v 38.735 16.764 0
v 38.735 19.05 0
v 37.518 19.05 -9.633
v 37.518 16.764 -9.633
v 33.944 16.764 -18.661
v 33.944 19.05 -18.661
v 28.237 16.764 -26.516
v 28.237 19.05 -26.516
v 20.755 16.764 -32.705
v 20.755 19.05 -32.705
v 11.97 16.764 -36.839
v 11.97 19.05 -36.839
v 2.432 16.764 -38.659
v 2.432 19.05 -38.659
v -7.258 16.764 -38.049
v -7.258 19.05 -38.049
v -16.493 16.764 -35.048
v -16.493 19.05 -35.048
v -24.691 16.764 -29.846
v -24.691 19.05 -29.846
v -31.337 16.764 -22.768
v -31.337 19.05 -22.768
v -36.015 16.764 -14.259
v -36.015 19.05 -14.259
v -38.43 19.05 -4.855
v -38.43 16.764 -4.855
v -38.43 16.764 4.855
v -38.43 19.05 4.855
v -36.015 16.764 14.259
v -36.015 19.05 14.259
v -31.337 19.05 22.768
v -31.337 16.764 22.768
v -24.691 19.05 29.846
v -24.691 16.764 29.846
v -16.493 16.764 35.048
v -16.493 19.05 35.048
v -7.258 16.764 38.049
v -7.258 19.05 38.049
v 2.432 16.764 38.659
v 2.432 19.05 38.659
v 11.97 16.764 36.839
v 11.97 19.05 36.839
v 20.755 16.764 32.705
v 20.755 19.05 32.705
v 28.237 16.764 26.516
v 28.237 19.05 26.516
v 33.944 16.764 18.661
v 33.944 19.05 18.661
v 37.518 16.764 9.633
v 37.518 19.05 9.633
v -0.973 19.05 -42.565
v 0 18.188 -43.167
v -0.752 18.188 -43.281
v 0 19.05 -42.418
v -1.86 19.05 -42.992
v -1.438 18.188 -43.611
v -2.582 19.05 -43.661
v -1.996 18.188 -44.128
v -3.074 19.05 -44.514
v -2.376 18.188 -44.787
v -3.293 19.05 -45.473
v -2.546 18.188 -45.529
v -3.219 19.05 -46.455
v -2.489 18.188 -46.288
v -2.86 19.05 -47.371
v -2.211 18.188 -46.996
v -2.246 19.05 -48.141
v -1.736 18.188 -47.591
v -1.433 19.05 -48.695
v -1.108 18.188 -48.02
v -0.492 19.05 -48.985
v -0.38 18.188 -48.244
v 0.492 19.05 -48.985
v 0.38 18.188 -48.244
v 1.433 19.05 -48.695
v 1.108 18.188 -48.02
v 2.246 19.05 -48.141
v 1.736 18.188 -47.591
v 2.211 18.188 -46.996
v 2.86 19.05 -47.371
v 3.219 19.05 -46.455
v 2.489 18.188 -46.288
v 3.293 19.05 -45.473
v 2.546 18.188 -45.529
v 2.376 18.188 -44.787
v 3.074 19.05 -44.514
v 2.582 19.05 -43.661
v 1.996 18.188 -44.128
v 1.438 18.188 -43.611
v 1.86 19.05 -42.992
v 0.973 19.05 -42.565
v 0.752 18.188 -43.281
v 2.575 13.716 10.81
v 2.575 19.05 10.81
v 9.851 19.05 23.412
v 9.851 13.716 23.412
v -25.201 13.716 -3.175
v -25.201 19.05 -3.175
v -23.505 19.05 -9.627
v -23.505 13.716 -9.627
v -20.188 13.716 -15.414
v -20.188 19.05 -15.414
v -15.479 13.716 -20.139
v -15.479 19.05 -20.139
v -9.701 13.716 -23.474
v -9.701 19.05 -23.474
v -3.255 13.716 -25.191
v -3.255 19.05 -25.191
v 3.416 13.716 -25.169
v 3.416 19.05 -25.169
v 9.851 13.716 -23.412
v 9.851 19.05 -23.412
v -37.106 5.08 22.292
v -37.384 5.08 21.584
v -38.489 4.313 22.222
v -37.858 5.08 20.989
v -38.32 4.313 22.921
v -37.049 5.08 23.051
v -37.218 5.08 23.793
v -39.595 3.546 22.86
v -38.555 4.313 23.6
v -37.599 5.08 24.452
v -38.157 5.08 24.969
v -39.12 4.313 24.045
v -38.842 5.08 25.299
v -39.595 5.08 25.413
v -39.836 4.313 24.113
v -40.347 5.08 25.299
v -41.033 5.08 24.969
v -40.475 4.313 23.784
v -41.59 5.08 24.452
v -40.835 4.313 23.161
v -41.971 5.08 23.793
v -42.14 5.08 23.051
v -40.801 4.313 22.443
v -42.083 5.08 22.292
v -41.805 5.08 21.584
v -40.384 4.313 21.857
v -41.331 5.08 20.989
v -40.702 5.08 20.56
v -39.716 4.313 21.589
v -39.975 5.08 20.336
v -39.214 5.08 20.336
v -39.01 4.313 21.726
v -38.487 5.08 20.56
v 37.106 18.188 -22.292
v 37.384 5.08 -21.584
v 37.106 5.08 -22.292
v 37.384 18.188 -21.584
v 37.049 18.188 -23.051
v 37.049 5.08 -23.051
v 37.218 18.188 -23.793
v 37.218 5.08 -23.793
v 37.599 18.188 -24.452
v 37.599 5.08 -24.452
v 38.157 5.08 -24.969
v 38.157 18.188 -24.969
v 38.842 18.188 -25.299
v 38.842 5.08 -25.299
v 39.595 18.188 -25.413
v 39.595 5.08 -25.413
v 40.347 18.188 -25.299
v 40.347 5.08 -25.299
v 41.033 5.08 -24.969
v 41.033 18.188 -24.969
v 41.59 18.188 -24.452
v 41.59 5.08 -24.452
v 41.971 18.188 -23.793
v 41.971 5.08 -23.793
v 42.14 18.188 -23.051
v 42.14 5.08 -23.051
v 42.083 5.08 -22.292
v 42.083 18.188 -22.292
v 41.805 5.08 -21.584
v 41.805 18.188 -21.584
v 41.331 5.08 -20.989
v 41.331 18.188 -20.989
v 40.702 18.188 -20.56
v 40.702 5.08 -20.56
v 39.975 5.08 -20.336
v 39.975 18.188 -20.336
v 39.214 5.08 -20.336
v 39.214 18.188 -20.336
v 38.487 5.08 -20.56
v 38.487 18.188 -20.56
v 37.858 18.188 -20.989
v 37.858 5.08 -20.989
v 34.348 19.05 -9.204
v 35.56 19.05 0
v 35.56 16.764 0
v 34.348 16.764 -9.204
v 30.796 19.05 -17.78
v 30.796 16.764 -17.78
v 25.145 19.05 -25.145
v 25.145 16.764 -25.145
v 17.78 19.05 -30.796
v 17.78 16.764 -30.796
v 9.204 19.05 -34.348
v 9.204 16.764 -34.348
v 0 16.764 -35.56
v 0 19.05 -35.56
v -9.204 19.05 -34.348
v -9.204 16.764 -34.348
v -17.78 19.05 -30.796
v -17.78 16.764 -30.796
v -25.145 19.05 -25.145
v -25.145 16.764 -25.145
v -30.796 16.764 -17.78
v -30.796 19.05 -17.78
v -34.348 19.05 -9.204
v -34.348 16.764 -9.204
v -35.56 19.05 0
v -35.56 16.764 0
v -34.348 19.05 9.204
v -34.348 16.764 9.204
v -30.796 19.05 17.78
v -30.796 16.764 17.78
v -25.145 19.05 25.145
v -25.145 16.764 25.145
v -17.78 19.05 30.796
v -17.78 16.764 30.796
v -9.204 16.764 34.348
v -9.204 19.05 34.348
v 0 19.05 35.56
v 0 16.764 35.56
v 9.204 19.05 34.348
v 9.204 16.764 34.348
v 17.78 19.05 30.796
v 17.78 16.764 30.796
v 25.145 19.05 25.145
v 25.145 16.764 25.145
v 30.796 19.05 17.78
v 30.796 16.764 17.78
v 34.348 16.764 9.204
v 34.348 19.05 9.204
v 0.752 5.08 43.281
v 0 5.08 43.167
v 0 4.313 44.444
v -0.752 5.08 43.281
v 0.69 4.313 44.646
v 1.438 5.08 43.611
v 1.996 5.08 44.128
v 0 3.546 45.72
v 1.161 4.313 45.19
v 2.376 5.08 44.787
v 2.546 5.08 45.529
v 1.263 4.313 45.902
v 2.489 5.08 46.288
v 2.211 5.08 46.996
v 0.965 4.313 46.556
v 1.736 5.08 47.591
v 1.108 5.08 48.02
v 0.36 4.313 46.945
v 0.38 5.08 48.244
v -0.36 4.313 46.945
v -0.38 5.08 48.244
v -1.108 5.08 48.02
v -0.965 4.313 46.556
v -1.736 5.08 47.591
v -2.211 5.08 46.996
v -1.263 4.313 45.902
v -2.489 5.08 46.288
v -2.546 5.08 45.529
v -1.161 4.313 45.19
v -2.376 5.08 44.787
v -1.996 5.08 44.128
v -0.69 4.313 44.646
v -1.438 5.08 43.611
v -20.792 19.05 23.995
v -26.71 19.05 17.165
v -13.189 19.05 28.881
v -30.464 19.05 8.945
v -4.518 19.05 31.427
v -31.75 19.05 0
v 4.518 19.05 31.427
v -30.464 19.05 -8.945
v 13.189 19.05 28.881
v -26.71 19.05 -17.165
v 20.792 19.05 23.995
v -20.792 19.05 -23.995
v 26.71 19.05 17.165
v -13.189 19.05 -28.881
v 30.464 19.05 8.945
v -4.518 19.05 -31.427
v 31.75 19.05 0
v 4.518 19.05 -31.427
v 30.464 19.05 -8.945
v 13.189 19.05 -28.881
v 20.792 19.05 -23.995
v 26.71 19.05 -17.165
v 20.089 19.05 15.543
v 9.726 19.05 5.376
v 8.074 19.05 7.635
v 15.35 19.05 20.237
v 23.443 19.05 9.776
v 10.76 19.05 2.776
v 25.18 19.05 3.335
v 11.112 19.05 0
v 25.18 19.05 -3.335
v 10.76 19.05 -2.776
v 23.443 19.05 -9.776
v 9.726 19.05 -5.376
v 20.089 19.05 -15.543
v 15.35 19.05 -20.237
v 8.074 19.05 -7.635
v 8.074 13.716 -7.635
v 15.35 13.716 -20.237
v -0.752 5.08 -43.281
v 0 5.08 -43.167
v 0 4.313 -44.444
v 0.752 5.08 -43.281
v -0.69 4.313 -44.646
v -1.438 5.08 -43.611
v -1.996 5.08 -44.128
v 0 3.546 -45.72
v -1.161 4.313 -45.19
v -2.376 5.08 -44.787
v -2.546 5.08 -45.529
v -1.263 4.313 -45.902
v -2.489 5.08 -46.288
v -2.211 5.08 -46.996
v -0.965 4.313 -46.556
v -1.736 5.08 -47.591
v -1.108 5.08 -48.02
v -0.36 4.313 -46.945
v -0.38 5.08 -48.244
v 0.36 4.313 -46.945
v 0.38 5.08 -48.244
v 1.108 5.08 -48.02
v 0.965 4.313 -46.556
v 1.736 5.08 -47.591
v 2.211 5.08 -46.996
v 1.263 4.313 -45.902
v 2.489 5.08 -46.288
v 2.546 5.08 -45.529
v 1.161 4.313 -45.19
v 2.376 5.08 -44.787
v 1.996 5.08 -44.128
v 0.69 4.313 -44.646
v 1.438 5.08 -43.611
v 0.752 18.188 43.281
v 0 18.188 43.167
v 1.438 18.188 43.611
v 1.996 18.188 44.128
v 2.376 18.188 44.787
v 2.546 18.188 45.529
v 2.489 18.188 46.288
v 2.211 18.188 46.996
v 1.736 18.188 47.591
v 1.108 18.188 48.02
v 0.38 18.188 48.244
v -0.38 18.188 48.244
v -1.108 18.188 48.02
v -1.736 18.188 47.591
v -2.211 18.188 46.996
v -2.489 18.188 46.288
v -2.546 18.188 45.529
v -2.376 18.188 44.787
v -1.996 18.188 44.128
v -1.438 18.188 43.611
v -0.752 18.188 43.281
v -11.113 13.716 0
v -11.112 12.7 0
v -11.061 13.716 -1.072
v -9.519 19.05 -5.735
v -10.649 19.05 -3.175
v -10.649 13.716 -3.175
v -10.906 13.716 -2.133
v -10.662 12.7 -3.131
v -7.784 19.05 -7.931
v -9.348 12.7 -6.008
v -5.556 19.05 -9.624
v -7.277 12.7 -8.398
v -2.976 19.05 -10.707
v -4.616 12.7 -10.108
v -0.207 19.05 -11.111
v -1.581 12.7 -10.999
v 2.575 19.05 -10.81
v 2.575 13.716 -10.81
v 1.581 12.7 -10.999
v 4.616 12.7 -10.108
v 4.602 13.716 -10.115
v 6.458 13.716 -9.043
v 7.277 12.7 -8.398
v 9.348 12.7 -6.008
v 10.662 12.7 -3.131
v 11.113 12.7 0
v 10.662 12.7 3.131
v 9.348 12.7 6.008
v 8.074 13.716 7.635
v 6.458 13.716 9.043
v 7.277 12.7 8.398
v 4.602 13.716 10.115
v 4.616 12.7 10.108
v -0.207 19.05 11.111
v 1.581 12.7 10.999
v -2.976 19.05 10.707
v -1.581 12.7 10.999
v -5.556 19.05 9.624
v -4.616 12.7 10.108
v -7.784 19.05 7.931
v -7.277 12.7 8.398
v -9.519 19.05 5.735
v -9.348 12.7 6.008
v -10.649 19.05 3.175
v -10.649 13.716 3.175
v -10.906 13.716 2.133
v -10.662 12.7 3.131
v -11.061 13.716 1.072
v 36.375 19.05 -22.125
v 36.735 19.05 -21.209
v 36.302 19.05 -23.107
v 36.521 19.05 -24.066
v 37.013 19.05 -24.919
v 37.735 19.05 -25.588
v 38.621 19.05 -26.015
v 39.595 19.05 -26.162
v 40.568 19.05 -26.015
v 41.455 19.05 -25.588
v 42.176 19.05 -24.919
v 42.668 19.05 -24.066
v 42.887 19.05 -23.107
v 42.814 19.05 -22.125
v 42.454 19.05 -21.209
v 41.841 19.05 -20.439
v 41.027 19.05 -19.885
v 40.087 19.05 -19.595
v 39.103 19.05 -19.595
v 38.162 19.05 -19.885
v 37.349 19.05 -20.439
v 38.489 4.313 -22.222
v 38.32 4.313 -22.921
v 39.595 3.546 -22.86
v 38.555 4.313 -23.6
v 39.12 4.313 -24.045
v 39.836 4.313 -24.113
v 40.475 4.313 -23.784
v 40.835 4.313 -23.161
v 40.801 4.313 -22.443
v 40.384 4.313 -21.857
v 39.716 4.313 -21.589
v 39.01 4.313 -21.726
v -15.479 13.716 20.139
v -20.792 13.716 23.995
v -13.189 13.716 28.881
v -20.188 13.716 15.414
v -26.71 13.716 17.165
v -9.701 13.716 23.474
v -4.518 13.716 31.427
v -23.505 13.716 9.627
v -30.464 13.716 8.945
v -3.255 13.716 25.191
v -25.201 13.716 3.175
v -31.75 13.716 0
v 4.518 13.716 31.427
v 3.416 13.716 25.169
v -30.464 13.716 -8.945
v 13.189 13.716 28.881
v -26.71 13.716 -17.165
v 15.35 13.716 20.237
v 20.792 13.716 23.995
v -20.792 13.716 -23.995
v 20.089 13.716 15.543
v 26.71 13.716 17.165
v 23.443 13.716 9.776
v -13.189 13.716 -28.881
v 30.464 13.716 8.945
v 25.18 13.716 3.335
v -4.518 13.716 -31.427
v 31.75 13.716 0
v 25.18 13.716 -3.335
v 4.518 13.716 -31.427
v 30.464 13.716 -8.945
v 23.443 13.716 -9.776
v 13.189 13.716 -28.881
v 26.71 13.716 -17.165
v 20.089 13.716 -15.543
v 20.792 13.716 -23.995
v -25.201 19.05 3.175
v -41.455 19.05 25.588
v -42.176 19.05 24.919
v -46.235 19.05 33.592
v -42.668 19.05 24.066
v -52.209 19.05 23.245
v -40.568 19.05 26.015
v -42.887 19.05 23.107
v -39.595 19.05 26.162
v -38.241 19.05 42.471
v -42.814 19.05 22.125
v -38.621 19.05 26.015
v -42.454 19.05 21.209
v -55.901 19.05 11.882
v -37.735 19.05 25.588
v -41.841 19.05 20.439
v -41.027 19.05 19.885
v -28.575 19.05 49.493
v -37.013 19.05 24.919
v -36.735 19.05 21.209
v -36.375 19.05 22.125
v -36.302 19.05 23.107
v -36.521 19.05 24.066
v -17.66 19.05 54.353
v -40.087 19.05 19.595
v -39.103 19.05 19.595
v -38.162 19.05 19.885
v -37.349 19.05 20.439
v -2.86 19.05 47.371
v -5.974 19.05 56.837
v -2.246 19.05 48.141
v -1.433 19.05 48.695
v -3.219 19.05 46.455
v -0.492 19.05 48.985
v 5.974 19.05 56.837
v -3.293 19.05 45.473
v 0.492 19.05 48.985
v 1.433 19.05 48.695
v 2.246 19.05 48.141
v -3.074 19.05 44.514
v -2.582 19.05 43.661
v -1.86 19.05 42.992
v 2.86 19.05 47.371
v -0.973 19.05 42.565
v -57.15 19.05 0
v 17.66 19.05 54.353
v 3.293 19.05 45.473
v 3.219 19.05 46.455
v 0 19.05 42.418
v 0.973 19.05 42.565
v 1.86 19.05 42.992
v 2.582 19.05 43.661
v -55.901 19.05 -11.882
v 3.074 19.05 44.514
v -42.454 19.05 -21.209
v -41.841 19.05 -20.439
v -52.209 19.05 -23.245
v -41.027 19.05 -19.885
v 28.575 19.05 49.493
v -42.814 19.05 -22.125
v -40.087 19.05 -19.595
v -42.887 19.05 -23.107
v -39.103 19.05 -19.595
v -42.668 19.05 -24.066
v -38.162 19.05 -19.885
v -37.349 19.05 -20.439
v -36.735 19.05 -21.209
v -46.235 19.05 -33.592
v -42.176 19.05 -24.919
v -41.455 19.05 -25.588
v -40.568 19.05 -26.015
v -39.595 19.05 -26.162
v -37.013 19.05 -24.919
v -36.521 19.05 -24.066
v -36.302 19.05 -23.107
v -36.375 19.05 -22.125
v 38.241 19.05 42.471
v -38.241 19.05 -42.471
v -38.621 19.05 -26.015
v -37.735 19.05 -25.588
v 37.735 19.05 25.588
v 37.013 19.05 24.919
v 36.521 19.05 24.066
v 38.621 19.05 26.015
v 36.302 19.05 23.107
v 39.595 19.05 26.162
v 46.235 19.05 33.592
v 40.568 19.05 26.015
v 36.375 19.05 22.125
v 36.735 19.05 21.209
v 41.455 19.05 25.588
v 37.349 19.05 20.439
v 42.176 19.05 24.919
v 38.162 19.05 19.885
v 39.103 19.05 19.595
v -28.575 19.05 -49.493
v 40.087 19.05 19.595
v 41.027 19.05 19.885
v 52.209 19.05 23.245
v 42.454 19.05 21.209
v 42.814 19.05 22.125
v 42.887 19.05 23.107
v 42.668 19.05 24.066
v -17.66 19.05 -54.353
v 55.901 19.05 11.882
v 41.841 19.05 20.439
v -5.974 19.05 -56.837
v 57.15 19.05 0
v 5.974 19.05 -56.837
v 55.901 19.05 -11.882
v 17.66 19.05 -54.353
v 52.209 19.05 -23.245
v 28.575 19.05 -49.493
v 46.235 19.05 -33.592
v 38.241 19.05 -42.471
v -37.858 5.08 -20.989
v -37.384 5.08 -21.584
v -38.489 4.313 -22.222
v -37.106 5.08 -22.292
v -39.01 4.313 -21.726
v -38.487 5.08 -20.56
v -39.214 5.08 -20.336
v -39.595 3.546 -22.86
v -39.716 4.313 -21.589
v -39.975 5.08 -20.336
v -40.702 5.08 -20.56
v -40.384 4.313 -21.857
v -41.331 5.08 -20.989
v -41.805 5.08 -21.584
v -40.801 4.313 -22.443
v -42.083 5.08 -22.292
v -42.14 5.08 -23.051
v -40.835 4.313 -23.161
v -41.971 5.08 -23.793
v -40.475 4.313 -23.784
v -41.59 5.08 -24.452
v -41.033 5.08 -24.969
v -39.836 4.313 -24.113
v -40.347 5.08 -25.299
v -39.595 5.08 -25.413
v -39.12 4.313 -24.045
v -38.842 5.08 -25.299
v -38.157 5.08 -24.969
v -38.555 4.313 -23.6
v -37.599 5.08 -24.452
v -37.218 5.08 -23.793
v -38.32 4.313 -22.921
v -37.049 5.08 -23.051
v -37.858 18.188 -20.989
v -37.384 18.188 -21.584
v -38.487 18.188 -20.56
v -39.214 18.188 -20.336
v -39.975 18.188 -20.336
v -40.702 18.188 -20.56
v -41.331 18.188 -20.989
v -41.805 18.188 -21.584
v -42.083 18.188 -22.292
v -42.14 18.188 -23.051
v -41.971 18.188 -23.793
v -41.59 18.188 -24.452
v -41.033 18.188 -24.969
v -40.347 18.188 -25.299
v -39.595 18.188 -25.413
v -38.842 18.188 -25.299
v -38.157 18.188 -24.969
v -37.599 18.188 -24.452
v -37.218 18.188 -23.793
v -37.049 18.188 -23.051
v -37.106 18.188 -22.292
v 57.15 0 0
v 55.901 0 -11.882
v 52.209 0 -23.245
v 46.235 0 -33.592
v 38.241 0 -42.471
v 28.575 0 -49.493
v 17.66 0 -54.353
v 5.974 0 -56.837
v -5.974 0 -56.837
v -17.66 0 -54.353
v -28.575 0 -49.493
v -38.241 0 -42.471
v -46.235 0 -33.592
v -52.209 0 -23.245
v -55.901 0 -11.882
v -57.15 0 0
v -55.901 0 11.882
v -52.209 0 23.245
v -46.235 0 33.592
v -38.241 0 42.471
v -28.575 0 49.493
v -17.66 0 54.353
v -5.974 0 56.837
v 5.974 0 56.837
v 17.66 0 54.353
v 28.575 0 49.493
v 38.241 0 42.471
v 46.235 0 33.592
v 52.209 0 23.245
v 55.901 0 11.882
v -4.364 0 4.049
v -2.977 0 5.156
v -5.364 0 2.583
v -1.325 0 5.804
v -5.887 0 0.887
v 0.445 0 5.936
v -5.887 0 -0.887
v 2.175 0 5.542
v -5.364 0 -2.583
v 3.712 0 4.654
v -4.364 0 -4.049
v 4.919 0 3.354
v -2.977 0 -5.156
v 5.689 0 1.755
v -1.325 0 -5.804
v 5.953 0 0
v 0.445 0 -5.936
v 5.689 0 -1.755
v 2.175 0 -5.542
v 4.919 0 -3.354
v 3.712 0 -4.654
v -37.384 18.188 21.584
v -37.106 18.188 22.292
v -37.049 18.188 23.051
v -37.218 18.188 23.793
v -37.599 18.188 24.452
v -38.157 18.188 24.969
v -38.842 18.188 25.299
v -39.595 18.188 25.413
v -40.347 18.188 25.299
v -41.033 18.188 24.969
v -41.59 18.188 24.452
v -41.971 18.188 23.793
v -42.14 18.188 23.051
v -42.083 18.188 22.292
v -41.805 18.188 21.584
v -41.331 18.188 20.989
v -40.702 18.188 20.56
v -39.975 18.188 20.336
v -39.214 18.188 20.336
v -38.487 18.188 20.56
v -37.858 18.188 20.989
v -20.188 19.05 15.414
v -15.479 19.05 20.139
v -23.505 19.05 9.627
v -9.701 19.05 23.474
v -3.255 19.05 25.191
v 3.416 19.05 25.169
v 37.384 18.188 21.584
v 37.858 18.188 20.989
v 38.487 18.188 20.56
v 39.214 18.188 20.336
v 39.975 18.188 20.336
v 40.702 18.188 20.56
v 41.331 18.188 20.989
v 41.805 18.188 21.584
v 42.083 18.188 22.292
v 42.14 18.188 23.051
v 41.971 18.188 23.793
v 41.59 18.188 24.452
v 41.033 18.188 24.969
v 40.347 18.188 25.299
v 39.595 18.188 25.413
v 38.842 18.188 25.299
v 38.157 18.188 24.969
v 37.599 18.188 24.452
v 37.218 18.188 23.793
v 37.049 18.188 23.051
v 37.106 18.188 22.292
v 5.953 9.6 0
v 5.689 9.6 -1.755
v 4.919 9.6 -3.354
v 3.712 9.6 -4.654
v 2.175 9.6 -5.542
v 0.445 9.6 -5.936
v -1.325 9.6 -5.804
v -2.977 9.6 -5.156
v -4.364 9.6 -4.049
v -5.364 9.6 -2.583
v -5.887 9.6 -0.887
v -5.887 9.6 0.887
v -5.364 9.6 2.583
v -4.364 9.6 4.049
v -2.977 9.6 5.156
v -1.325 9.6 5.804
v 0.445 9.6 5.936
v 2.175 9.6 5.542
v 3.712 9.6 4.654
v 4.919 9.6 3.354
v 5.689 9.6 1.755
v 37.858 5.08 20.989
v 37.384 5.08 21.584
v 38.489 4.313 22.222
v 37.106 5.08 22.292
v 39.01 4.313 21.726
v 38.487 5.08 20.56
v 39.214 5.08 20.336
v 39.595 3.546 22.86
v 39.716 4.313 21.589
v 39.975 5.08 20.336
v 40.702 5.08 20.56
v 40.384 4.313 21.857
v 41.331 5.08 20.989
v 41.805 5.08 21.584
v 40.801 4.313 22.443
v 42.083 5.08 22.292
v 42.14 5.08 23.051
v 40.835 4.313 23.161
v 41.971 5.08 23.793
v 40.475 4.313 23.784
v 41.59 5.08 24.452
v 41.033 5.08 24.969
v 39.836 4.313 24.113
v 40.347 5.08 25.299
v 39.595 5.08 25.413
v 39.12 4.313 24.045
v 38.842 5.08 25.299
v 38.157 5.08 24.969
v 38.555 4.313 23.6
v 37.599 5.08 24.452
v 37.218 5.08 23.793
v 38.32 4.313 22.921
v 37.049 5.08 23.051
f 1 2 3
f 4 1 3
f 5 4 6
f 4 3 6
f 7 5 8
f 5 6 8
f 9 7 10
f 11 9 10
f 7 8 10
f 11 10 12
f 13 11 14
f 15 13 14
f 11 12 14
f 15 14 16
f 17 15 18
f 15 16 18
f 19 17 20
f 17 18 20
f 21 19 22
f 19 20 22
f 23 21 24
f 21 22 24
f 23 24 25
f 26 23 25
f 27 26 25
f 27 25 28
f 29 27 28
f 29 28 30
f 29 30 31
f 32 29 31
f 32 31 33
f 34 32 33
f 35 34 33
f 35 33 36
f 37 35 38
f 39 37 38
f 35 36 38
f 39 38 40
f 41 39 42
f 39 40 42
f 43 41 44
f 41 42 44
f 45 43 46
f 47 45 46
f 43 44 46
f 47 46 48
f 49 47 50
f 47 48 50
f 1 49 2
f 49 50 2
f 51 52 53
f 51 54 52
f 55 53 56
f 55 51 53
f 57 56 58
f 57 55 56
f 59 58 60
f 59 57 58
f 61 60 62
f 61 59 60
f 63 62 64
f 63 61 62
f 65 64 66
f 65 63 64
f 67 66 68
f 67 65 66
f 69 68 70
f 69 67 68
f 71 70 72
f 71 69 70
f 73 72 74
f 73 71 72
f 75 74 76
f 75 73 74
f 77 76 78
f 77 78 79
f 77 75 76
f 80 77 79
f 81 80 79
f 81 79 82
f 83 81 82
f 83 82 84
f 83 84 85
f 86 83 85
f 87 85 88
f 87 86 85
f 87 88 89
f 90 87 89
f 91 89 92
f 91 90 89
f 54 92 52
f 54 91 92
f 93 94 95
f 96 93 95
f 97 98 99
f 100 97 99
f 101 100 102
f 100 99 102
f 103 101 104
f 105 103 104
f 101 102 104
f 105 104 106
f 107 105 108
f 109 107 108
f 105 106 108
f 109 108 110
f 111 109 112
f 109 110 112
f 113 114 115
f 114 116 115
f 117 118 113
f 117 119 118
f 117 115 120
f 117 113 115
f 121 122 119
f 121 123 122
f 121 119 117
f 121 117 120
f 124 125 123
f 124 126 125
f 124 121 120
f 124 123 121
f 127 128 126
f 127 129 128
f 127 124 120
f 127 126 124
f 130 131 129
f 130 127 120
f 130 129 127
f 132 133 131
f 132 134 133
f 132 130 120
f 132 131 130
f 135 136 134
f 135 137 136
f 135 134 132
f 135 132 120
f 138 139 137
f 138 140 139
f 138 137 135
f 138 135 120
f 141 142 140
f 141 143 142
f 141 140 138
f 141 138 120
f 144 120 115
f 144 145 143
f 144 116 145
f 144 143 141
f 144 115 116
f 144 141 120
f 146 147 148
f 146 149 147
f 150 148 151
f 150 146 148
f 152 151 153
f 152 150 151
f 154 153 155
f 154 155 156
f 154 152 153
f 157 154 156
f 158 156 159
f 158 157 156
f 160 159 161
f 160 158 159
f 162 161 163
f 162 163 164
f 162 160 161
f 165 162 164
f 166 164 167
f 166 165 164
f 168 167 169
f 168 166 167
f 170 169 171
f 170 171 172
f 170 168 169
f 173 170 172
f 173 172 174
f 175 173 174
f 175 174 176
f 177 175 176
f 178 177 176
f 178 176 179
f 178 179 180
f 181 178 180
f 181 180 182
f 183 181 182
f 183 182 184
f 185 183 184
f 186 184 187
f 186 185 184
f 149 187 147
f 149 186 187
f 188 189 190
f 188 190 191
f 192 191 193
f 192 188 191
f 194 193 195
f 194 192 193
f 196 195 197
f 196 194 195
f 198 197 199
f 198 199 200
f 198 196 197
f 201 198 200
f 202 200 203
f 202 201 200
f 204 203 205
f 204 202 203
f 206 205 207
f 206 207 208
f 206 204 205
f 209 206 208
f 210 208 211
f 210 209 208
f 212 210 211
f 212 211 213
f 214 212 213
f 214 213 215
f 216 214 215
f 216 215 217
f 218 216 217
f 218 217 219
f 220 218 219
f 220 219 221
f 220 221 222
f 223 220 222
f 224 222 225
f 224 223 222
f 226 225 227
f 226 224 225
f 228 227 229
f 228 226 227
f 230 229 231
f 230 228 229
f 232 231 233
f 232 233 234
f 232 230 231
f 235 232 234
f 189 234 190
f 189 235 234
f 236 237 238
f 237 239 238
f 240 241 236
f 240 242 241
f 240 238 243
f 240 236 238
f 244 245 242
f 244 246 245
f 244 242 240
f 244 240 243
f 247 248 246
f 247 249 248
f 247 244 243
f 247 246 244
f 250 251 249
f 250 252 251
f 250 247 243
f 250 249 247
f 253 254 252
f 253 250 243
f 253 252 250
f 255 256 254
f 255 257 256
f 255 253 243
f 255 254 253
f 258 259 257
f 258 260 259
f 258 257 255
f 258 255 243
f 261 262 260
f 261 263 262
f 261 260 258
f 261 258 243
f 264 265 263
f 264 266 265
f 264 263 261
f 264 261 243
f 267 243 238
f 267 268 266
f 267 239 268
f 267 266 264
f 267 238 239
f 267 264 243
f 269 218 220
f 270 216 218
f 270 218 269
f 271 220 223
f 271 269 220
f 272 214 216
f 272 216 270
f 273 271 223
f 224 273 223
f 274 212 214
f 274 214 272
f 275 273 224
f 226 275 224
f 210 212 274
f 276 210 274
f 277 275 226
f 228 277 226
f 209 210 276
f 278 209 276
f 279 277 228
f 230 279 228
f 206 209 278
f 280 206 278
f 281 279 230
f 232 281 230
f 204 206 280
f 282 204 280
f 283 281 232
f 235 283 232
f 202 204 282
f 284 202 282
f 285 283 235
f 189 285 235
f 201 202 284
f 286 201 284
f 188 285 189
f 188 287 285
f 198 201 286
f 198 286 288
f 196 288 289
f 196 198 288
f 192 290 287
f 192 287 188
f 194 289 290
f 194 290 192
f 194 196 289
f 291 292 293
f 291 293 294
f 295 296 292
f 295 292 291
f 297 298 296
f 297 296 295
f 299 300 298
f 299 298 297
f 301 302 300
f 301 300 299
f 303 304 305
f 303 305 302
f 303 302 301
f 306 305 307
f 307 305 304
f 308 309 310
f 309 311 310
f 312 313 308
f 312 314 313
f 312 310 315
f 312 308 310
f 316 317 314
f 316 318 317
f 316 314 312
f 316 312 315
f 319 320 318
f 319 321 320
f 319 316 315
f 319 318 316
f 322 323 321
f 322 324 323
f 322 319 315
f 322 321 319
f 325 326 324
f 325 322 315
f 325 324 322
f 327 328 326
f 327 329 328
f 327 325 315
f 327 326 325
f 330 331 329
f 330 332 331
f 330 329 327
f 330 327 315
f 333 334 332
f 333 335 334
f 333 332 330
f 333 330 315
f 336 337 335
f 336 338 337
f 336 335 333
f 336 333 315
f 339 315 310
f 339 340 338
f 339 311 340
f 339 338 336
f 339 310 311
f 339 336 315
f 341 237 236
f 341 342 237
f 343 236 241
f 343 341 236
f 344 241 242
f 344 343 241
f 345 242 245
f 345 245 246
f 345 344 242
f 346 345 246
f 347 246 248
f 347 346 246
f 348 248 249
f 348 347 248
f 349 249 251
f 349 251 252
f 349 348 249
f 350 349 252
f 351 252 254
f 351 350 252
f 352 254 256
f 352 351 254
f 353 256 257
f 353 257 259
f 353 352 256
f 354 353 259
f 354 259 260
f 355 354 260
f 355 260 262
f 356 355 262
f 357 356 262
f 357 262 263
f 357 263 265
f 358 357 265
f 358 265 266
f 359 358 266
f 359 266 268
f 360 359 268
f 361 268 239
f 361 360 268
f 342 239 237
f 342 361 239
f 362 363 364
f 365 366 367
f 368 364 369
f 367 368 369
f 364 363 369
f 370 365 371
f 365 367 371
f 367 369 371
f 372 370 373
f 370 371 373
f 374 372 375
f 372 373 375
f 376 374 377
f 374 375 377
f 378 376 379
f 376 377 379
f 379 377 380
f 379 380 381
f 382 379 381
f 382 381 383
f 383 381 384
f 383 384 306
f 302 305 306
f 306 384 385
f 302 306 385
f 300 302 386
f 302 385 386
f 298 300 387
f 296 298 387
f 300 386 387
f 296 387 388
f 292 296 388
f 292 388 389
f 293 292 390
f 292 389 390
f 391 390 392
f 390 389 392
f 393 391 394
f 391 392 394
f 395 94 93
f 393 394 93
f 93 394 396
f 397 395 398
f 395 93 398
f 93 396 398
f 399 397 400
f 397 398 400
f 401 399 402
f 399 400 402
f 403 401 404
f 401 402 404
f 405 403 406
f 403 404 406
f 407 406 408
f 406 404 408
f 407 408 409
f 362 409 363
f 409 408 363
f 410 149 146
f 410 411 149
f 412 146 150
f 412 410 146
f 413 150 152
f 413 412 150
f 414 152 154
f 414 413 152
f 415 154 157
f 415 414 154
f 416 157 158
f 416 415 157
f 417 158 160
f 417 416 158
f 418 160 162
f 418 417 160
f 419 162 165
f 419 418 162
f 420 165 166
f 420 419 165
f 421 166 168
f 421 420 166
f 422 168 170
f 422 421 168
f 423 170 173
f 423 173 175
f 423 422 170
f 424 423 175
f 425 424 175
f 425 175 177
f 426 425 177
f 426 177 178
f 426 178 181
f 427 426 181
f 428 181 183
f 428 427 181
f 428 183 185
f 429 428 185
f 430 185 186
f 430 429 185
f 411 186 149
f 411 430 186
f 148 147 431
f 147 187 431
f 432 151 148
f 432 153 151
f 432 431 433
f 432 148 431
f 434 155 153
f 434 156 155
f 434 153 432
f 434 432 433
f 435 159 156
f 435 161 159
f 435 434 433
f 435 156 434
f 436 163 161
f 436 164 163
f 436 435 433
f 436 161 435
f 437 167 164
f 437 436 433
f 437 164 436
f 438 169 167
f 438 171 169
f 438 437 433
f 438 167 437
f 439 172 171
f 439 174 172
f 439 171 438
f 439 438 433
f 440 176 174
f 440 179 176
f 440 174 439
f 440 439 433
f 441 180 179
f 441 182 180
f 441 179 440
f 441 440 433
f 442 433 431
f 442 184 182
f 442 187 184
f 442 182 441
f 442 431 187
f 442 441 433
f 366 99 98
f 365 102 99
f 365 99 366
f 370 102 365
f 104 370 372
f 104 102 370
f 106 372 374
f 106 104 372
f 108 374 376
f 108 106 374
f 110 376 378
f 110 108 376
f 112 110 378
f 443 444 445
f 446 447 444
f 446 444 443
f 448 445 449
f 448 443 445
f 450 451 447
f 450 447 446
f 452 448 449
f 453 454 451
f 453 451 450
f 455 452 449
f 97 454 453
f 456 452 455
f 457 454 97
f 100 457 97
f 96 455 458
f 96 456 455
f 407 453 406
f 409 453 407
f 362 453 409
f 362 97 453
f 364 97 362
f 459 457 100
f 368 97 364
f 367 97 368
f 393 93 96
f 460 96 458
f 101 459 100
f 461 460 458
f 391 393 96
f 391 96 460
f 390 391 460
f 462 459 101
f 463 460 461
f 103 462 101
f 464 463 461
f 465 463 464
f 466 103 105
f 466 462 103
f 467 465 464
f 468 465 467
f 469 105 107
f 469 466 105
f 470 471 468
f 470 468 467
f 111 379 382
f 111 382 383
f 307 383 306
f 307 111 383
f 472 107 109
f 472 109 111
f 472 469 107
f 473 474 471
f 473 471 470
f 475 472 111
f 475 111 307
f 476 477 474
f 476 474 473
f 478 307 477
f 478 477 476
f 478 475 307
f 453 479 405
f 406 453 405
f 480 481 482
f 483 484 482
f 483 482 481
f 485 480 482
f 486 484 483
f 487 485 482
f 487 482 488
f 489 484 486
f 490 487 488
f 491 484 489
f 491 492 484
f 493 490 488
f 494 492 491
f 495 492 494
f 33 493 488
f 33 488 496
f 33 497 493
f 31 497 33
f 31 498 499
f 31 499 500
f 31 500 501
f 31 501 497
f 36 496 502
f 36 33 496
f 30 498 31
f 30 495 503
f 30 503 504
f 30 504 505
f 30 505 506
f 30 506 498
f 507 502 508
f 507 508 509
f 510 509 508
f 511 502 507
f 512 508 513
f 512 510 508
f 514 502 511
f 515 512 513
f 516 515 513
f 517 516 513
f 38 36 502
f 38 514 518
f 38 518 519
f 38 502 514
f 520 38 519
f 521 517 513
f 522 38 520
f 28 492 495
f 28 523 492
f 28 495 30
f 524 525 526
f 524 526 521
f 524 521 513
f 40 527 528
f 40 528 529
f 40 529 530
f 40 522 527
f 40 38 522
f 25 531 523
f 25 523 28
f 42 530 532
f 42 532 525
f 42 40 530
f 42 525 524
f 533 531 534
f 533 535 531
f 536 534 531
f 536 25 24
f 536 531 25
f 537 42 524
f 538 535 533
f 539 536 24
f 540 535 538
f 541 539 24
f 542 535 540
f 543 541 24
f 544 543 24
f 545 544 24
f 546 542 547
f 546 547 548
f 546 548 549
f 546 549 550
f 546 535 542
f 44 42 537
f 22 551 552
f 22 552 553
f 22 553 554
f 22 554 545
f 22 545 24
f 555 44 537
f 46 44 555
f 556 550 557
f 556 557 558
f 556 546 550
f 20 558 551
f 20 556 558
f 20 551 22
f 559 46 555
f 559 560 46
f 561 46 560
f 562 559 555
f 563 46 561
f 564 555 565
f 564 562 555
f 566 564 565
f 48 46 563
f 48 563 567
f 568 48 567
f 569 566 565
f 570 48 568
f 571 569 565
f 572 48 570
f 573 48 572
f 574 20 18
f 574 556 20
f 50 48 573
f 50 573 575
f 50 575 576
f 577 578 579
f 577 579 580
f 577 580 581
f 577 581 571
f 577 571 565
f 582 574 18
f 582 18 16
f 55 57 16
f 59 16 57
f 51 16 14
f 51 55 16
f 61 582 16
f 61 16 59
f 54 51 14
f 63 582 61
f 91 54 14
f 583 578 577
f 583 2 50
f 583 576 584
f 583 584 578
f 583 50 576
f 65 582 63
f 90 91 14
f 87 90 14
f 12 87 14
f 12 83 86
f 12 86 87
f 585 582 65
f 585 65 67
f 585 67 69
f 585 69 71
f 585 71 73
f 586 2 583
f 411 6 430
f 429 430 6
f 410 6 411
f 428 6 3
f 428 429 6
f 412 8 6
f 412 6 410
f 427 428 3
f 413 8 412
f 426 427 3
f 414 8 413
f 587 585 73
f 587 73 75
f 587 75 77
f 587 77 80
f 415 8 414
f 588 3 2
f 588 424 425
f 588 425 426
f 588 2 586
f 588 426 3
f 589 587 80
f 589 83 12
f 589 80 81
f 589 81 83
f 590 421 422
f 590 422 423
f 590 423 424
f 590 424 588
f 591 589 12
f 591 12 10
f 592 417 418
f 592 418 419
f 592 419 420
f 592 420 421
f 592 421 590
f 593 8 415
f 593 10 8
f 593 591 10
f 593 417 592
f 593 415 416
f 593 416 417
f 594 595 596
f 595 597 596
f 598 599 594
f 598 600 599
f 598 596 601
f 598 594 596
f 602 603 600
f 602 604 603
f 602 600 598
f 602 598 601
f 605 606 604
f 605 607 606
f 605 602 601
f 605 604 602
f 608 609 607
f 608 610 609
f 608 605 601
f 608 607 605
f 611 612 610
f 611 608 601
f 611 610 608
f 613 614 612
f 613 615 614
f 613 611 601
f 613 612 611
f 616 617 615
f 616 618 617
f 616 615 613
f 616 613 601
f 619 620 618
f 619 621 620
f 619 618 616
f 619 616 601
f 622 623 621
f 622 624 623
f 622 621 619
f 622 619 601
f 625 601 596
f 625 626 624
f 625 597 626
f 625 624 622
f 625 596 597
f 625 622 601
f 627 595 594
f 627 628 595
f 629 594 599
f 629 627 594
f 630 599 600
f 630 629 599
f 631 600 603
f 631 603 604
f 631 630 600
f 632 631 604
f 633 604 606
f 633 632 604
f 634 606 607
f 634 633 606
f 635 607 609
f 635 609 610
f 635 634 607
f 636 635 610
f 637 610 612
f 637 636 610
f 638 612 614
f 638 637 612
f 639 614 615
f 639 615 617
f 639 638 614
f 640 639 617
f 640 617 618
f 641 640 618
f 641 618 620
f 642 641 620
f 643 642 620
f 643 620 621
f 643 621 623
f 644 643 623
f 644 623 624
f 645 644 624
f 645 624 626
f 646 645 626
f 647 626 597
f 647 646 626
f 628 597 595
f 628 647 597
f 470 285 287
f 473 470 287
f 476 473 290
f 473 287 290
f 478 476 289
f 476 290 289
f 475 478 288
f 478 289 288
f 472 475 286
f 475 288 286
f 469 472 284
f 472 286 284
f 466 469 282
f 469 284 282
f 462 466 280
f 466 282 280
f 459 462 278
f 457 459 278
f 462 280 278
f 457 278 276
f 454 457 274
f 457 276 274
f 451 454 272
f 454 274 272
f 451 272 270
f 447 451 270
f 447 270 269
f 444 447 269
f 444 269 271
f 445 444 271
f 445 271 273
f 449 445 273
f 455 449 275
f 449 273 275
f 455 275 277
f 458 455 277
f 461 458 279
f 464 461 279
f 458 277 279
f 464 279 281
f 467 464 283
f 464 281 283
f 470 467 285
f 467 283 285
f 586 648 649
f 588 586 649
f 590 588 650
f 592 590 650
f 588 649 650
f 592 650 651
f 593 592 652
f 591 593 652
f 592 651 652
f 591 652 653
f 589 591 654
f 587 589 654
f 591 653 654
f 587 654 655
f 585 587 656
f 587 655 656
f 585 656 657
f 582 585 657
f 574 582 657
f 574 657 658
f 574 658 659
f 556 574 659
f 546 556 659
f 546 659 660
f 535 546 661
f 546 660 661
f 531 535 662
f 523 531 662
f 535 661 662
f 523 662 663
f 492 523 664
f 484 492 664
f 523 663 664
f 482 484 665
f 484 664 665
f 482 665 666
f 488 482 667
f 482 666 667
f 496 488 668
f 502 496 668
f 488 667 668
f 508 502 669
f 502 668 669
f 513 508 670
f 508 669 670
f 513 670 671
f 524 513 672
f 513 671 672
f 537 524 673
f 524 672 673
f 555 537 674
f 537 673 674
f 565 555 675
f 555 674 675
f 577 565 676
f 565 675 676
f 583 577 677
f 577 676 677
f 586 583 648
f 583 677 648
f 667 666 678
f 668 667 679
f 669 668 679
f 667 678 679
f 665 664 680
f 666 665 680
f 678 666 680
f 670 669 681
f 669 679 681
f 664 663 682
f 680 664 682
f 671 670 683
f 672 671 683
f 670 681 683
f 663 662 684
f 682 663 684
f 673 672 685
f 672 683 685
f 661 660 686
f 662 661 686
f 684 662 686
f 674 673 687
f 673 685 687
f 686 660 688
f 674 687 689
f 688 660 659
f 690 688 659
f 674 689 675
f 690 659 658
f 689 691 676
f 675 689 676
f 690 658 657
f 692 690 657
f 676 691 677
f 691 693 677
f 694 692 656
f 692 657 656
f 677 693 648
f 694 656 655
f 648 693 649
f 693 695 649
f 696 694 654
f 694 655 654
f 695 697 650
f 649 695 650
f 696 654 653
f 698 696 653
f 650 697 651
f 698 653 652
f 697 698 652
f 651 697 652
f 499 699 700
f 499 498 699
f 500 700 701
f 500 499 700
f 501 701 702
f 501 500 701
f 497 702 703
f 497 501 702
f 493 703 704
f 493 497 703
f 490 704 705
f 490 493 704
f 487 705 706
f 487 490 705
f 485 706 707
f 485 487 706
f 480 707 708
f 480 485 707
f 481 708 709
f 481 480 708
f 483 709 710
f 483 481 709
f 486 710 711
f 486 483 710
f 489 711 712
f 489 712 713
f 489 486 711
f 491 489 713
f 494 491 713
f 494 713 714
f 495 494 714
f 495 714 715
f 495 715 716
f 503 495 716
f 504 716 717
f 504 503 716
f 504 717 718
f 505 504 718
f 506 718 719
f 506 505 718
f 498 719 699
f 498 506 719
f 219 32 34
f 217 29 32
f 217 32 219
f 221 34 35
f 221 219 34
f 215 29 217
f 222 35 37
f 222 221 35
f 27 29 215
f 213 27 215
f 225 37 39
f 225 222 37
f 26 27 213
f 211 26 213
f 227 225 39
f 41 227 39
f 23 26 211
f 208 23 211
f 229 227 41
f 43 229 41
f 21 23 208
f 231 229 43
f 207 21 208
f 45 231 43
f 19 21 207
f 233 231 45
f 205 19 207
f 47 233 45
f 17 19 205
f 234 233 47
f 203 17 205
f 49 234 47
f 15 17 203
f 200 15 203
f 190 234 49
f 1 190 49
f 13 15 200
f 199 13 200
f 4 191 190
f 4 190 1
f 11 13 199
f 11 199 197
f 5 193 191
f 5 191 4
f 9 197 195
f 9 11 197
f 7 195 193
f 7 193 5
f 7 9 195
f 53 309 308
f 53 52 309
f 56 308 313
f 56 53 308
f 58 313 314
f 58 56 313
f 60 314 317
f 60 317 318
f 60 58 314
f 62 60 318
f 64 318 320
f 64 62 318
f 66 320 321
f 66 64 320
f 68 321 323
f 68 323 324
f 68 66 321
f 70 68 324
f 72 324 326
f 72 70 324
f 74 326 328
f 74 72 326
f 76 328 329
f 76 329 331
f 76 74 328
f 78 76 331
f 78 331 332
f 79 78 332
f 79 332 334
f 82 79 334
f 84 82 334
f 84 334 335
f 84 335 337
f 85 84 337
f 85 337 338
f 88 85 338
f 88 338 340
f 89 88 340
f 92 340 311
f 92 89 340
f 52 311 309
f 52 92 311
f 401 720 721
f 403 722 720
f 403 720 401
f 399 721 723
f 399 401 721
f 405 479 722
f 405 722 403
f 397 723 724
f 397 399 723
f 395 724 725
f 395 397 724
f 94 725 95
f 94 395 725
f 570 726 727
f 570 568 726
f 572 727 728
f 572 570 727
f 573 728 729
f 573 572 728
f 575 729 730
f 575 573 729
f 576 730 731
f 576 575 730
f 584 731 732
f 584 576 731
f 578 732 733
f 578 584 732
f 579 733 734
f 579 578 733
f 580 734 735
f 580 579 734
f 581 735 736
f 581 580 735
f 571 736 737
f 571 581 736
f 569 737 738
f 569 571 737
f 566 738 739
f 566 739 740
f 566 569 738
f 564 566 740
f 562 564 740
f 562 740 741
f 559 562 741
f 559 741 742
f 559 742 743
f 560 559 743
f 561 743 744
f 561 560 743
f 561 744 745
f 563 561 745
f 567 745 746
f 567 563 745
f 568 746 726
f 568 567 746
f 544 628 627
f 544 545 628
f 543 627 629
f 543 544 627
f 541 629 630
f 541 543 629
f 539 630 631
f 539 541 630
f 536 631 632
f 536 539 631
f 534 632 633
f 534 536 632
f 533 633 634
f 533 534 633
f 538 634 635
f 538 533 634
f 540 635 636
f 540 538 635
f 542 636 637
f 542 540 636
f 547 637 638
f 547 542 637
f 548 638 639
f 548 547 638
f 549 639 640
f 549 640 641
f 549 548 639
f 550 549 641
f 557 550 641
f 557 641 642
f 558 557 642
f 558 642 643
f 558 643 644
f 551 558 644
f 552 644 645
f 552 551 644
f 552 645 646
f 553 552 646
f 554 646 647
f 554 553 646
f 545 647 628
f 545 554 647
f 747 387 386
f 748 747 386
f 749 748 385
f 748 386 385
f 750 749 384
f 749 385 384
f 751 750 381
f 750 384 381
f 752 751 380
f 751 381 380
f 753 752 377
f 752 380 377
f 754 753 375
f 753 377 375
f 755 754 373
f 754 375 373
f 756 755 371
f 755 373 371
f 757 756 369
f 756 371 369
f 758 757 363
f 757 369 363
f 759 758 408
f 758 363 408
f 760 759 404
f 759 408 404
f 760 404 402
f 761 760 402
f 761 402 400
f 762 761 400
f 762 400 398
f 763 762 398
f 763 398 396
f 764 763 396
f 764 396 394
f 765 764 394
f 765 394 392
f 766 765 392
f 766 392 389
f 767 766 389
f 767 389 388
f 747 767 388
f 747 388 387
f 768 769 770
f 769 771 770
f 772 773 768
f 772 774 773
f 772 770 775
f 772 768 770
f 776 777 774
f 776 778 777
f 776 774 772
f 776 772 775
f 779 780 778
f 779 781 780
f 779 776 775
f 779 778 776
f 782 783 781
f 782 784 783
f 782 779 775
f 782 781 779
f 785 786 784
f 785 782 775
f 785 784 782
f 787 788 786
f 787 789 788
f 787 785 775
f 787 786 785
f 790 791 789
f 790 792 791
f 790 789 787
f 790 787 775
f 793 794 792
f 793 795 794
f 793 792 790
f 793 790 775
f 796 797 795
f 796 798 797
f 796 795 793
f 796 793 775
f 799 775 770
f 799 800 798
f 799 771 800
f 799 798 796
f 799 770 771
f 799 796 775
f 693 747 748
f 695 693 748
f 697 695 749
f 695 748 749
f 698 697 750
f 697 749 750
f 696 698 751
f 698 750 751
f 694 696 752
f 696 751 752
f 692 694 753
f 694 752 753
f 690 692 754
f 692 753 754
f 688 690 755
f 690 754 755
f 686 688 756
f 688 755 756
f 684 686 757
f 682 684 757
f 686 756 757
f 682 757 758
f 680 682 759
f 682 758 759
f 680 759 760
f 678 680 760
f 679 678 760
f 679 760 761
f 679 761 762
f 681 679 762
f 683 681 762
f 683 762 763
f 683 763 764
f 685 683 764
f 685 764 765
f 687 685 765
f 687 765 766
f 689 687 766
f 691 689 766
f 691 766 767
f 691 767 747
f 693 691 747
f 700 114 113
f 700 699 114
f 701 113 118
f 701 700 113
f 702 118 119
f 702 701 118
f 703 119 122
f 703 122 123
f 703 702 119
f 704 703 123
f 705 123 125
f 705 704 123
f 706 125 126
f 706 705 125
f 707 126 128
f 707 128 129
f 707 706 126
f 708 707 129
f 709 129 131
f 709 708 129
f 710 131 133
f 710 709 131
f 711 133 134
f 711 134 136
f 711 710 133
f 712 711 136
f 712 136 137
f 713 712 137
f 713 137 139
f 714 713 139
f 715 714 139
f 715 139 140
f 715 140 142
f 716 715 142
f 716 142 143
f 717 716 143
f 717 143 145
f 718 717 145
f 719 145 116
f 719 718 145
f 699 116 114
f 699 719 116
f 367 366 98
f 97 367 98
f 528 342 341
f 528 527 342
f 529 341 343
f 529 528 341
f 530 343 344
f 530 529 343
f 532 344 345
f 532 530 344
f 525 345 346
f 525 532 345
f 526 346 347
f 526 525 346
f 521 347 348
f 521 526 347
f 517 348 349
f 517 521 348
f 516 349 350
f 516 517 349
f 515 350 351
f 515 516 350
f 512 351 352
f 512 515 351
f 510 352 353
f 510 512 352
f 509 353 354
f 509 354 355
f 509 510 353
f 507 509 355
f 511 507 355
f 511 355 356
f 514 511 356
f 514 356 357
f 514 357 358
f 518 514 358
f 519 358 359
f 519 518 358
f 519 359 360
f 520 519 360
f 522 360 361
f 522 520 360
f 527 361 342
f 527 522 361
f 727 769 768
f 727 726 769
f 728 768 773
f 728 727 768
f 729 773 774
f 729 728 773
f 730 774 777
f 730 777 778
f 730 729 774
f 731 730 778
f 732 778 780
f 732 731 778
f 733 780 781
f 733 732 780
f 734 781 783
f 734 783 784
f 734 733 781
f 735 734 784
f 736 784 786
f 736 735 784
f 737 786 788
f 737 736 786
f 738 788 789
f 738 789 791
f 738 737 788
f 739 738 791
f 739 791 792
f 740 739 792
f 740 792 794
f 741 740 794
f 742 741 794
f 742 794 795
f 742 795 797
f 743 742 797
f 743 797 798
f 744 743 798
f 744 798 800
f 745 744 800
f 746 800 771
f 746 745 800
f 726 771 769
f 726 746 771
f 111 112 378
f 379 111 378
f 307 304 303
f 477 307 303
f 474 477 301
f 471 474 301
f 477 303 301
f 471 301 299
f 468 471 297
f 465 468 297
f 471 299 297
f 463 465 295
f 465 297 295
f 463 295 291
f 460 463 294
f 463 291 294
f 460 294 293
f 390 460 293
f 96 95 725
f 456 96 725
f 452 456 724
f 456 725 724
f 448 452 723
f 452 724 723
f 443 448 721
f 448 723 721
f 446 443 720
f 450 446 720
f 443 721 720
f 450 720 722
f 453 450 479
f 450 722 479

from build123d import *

# Parameters (mm, degrees)
SKETCH1_R                        = 57.15
BOSS_EXTRUDE1_DEPTH              = 19.05
F_7_8_0_875_DIAMETER_HOLE1_D     = 22.225
F_7_8_0_875_DIAMETER_HOLE1_DEPTH = 6.35
F_7_8_0_875_DIAMETER_HOLE1_TIP   = 6.677063629
SKETCH4_R                        = 5.953125
CUT_EXTRUDE1_DEPTH               = 1
CUT_EXTRUDE1_DEPTH_BACK          = 20.05
ANNULUS_CHANNEL_R                = 31.75
ANNULUS_CHANNEL_DEPTH_DEPTH      = 5.334
SKETCH7_R                        = 38.735
SKETCH7_R_2                      = 35.56
CUT_EXTRUDE5_DEPTH               = 2.286
CIRPATTERN1_COUNT                = 6


with BuildPart() as part:
    # Sketch1 → Boss-Extrude1 (new body)
    with BuildSketch(Plane(origin=(0, 0, 0), x_dir=(1, 0, 0), z_dir=(0, 1, 0))):
        Circle(SKETCH1_R)
    extrude(amount=BOSS_EXTRUDE1_DEPTH)

    # 7/8 (0.875) Diameter Hole1
    with Locations(Plane(origin=(0, 19.05, 0), x_dir=(1, 0, 0), z_dir=(0, 1, 0))):
        with Locations((0, 0)):
            Hole(F_7_8_0_875_DIAMETER_HOLE1_D / 2, depth=F_7_8_0_875_DIAMETER_HOLE1_DEPTH)
            with Locations((0, 0, -(F_7_8_0_875_DIAMETER_HOLE1_DEPTH + F_7_8_0_875_DIAMETER_HOLE1_TIP / 2))):  # 118° drill point
                Cone(0, F_7_8_0_875_DIAMETER_HOLE1_D / 2, F_7_8_0_875_DIAMETER_HOLE1_TIP, mode=Mode.SUBTRACT)

    # Sketch4 → Cut-Extrude1 (cut, two sides)
    with BuildSketch(Plane(origin=(0, 19.05, 0), x_dir=(1, 0, 0), z_dir=(0, 1, 0))) as cut_extrude1_sk:
        Circle(SKETCH4_R)
    extrude(amount=CUT_EXTRUDE1_DEPTH, mode=Mode.SUBTRACT)
    extrude(cut_extrude1_sk.sketch, amount=-CUT_EXTRUDE1_DEPTH_BACK, mode=Mode.SUBTRACT)

    # Annulus Channel → Annulus Channel Depth (cut)
    with BuildSketch(Plane(origin=(0, 19.05, 0), x_dir=(1, 0, 0), z_dir=(0, 1, 0))):
        Circle(ANNULUS_CHANNEL_R)
        with BuildLine():
            Line((-10.649273743, 3.175), (-25.200781238, 3.175))
            ThreePointArc((-25.200781238, 3.175), (-12.7, 21.997045256), (9.850759962, 23.412016747))
            Line((9.850759962, 23.412016747), (2.575006214, 10.810041593))
            ThreePointArc((2.575006214, 10.810041593), (5.55625, 9.6237073), (8.074267528, 7.635041593))
            Line((8.074267528, 7.635041593), (15.350021276, 20.237016747))
            ThreePointArc((15.350021276, 20.237016747), (25.4, 0), (15.350021276, -20.237016747))
            Line((15.350021276, -20.237016747), (8.074267528, -7.635041593))
            ThreePointArc((8.074267528, -7.635041593), (5.55625, -9.6237073), (2.575006214, -10.810041593))
            Line((2.575006214, -10.810041593), (9.850759962, -23.412016747))
            ThreePointArc((9.850759962, -23.412016747), (-12.7, -21.997045256), (-25.200781238, -3.175))
            Line((-25.200781238, -3.175), (-10.649273743, -3.175))
            ThreePointArc((-10.649273743, -3.175), (-11.1125, 0), (-10.649273743, 3.175))
        make_face(mode=Mode.SUBTRACT)
    extrude(amount=-ANNULUS_CHANNEL_DEPTH_DEPTH, mode=Mode.SUBTRACT)

    # Sketch7 → Cut-Extrude5 (cut)
    with BuildSketch(Plane(origin=(0, 19.05, 0), x_dir=(1, 0, 0), z_dir=(0, 1, 0))):
        Circle(SKETCH7_R)
        Circle(SKETCH7_R_2, mode=Mode.SUBTRACT)
    extrude(amount=-CUT_EXTRUDE5_DEPTH, mode=Mode.SUBTRACT)

    # Sketch9 → 1/4-20 Tapped Hole1 (revolve, cut)
    with BuildSketch(Plane(origin=(0, 19.05, -45.72), x_dir=(0, 0, 1), z_dir=(1, 0, 0))):
        Polygon((0, 0), (0, 15.503816902), (2.5527, 13.97), (2.5527, 0.861971048), (3.302, 0), align=None)
    f_1_4_20_tapped_hole1 = revolve(axis=Axis((0, 25.4, -45.72), (0, -1, 0)), mode=Mode.SUBTRACT)

    # CirPattern1: 1/4-20 Tapped Hole1 ×6 about axis
    cirpattern1_axis = Axis((0, 0, 0), (0, 1, 0))
    for i in range(1, CIRPATTERN1_COUNT):
        add(f_1_4_20_tapped_hole1.rotate(cirpattern1_axis, i * 360 / CIRPATTERN1_COUNT), mode=Mode.SUBTRACT)


solid = part.part
